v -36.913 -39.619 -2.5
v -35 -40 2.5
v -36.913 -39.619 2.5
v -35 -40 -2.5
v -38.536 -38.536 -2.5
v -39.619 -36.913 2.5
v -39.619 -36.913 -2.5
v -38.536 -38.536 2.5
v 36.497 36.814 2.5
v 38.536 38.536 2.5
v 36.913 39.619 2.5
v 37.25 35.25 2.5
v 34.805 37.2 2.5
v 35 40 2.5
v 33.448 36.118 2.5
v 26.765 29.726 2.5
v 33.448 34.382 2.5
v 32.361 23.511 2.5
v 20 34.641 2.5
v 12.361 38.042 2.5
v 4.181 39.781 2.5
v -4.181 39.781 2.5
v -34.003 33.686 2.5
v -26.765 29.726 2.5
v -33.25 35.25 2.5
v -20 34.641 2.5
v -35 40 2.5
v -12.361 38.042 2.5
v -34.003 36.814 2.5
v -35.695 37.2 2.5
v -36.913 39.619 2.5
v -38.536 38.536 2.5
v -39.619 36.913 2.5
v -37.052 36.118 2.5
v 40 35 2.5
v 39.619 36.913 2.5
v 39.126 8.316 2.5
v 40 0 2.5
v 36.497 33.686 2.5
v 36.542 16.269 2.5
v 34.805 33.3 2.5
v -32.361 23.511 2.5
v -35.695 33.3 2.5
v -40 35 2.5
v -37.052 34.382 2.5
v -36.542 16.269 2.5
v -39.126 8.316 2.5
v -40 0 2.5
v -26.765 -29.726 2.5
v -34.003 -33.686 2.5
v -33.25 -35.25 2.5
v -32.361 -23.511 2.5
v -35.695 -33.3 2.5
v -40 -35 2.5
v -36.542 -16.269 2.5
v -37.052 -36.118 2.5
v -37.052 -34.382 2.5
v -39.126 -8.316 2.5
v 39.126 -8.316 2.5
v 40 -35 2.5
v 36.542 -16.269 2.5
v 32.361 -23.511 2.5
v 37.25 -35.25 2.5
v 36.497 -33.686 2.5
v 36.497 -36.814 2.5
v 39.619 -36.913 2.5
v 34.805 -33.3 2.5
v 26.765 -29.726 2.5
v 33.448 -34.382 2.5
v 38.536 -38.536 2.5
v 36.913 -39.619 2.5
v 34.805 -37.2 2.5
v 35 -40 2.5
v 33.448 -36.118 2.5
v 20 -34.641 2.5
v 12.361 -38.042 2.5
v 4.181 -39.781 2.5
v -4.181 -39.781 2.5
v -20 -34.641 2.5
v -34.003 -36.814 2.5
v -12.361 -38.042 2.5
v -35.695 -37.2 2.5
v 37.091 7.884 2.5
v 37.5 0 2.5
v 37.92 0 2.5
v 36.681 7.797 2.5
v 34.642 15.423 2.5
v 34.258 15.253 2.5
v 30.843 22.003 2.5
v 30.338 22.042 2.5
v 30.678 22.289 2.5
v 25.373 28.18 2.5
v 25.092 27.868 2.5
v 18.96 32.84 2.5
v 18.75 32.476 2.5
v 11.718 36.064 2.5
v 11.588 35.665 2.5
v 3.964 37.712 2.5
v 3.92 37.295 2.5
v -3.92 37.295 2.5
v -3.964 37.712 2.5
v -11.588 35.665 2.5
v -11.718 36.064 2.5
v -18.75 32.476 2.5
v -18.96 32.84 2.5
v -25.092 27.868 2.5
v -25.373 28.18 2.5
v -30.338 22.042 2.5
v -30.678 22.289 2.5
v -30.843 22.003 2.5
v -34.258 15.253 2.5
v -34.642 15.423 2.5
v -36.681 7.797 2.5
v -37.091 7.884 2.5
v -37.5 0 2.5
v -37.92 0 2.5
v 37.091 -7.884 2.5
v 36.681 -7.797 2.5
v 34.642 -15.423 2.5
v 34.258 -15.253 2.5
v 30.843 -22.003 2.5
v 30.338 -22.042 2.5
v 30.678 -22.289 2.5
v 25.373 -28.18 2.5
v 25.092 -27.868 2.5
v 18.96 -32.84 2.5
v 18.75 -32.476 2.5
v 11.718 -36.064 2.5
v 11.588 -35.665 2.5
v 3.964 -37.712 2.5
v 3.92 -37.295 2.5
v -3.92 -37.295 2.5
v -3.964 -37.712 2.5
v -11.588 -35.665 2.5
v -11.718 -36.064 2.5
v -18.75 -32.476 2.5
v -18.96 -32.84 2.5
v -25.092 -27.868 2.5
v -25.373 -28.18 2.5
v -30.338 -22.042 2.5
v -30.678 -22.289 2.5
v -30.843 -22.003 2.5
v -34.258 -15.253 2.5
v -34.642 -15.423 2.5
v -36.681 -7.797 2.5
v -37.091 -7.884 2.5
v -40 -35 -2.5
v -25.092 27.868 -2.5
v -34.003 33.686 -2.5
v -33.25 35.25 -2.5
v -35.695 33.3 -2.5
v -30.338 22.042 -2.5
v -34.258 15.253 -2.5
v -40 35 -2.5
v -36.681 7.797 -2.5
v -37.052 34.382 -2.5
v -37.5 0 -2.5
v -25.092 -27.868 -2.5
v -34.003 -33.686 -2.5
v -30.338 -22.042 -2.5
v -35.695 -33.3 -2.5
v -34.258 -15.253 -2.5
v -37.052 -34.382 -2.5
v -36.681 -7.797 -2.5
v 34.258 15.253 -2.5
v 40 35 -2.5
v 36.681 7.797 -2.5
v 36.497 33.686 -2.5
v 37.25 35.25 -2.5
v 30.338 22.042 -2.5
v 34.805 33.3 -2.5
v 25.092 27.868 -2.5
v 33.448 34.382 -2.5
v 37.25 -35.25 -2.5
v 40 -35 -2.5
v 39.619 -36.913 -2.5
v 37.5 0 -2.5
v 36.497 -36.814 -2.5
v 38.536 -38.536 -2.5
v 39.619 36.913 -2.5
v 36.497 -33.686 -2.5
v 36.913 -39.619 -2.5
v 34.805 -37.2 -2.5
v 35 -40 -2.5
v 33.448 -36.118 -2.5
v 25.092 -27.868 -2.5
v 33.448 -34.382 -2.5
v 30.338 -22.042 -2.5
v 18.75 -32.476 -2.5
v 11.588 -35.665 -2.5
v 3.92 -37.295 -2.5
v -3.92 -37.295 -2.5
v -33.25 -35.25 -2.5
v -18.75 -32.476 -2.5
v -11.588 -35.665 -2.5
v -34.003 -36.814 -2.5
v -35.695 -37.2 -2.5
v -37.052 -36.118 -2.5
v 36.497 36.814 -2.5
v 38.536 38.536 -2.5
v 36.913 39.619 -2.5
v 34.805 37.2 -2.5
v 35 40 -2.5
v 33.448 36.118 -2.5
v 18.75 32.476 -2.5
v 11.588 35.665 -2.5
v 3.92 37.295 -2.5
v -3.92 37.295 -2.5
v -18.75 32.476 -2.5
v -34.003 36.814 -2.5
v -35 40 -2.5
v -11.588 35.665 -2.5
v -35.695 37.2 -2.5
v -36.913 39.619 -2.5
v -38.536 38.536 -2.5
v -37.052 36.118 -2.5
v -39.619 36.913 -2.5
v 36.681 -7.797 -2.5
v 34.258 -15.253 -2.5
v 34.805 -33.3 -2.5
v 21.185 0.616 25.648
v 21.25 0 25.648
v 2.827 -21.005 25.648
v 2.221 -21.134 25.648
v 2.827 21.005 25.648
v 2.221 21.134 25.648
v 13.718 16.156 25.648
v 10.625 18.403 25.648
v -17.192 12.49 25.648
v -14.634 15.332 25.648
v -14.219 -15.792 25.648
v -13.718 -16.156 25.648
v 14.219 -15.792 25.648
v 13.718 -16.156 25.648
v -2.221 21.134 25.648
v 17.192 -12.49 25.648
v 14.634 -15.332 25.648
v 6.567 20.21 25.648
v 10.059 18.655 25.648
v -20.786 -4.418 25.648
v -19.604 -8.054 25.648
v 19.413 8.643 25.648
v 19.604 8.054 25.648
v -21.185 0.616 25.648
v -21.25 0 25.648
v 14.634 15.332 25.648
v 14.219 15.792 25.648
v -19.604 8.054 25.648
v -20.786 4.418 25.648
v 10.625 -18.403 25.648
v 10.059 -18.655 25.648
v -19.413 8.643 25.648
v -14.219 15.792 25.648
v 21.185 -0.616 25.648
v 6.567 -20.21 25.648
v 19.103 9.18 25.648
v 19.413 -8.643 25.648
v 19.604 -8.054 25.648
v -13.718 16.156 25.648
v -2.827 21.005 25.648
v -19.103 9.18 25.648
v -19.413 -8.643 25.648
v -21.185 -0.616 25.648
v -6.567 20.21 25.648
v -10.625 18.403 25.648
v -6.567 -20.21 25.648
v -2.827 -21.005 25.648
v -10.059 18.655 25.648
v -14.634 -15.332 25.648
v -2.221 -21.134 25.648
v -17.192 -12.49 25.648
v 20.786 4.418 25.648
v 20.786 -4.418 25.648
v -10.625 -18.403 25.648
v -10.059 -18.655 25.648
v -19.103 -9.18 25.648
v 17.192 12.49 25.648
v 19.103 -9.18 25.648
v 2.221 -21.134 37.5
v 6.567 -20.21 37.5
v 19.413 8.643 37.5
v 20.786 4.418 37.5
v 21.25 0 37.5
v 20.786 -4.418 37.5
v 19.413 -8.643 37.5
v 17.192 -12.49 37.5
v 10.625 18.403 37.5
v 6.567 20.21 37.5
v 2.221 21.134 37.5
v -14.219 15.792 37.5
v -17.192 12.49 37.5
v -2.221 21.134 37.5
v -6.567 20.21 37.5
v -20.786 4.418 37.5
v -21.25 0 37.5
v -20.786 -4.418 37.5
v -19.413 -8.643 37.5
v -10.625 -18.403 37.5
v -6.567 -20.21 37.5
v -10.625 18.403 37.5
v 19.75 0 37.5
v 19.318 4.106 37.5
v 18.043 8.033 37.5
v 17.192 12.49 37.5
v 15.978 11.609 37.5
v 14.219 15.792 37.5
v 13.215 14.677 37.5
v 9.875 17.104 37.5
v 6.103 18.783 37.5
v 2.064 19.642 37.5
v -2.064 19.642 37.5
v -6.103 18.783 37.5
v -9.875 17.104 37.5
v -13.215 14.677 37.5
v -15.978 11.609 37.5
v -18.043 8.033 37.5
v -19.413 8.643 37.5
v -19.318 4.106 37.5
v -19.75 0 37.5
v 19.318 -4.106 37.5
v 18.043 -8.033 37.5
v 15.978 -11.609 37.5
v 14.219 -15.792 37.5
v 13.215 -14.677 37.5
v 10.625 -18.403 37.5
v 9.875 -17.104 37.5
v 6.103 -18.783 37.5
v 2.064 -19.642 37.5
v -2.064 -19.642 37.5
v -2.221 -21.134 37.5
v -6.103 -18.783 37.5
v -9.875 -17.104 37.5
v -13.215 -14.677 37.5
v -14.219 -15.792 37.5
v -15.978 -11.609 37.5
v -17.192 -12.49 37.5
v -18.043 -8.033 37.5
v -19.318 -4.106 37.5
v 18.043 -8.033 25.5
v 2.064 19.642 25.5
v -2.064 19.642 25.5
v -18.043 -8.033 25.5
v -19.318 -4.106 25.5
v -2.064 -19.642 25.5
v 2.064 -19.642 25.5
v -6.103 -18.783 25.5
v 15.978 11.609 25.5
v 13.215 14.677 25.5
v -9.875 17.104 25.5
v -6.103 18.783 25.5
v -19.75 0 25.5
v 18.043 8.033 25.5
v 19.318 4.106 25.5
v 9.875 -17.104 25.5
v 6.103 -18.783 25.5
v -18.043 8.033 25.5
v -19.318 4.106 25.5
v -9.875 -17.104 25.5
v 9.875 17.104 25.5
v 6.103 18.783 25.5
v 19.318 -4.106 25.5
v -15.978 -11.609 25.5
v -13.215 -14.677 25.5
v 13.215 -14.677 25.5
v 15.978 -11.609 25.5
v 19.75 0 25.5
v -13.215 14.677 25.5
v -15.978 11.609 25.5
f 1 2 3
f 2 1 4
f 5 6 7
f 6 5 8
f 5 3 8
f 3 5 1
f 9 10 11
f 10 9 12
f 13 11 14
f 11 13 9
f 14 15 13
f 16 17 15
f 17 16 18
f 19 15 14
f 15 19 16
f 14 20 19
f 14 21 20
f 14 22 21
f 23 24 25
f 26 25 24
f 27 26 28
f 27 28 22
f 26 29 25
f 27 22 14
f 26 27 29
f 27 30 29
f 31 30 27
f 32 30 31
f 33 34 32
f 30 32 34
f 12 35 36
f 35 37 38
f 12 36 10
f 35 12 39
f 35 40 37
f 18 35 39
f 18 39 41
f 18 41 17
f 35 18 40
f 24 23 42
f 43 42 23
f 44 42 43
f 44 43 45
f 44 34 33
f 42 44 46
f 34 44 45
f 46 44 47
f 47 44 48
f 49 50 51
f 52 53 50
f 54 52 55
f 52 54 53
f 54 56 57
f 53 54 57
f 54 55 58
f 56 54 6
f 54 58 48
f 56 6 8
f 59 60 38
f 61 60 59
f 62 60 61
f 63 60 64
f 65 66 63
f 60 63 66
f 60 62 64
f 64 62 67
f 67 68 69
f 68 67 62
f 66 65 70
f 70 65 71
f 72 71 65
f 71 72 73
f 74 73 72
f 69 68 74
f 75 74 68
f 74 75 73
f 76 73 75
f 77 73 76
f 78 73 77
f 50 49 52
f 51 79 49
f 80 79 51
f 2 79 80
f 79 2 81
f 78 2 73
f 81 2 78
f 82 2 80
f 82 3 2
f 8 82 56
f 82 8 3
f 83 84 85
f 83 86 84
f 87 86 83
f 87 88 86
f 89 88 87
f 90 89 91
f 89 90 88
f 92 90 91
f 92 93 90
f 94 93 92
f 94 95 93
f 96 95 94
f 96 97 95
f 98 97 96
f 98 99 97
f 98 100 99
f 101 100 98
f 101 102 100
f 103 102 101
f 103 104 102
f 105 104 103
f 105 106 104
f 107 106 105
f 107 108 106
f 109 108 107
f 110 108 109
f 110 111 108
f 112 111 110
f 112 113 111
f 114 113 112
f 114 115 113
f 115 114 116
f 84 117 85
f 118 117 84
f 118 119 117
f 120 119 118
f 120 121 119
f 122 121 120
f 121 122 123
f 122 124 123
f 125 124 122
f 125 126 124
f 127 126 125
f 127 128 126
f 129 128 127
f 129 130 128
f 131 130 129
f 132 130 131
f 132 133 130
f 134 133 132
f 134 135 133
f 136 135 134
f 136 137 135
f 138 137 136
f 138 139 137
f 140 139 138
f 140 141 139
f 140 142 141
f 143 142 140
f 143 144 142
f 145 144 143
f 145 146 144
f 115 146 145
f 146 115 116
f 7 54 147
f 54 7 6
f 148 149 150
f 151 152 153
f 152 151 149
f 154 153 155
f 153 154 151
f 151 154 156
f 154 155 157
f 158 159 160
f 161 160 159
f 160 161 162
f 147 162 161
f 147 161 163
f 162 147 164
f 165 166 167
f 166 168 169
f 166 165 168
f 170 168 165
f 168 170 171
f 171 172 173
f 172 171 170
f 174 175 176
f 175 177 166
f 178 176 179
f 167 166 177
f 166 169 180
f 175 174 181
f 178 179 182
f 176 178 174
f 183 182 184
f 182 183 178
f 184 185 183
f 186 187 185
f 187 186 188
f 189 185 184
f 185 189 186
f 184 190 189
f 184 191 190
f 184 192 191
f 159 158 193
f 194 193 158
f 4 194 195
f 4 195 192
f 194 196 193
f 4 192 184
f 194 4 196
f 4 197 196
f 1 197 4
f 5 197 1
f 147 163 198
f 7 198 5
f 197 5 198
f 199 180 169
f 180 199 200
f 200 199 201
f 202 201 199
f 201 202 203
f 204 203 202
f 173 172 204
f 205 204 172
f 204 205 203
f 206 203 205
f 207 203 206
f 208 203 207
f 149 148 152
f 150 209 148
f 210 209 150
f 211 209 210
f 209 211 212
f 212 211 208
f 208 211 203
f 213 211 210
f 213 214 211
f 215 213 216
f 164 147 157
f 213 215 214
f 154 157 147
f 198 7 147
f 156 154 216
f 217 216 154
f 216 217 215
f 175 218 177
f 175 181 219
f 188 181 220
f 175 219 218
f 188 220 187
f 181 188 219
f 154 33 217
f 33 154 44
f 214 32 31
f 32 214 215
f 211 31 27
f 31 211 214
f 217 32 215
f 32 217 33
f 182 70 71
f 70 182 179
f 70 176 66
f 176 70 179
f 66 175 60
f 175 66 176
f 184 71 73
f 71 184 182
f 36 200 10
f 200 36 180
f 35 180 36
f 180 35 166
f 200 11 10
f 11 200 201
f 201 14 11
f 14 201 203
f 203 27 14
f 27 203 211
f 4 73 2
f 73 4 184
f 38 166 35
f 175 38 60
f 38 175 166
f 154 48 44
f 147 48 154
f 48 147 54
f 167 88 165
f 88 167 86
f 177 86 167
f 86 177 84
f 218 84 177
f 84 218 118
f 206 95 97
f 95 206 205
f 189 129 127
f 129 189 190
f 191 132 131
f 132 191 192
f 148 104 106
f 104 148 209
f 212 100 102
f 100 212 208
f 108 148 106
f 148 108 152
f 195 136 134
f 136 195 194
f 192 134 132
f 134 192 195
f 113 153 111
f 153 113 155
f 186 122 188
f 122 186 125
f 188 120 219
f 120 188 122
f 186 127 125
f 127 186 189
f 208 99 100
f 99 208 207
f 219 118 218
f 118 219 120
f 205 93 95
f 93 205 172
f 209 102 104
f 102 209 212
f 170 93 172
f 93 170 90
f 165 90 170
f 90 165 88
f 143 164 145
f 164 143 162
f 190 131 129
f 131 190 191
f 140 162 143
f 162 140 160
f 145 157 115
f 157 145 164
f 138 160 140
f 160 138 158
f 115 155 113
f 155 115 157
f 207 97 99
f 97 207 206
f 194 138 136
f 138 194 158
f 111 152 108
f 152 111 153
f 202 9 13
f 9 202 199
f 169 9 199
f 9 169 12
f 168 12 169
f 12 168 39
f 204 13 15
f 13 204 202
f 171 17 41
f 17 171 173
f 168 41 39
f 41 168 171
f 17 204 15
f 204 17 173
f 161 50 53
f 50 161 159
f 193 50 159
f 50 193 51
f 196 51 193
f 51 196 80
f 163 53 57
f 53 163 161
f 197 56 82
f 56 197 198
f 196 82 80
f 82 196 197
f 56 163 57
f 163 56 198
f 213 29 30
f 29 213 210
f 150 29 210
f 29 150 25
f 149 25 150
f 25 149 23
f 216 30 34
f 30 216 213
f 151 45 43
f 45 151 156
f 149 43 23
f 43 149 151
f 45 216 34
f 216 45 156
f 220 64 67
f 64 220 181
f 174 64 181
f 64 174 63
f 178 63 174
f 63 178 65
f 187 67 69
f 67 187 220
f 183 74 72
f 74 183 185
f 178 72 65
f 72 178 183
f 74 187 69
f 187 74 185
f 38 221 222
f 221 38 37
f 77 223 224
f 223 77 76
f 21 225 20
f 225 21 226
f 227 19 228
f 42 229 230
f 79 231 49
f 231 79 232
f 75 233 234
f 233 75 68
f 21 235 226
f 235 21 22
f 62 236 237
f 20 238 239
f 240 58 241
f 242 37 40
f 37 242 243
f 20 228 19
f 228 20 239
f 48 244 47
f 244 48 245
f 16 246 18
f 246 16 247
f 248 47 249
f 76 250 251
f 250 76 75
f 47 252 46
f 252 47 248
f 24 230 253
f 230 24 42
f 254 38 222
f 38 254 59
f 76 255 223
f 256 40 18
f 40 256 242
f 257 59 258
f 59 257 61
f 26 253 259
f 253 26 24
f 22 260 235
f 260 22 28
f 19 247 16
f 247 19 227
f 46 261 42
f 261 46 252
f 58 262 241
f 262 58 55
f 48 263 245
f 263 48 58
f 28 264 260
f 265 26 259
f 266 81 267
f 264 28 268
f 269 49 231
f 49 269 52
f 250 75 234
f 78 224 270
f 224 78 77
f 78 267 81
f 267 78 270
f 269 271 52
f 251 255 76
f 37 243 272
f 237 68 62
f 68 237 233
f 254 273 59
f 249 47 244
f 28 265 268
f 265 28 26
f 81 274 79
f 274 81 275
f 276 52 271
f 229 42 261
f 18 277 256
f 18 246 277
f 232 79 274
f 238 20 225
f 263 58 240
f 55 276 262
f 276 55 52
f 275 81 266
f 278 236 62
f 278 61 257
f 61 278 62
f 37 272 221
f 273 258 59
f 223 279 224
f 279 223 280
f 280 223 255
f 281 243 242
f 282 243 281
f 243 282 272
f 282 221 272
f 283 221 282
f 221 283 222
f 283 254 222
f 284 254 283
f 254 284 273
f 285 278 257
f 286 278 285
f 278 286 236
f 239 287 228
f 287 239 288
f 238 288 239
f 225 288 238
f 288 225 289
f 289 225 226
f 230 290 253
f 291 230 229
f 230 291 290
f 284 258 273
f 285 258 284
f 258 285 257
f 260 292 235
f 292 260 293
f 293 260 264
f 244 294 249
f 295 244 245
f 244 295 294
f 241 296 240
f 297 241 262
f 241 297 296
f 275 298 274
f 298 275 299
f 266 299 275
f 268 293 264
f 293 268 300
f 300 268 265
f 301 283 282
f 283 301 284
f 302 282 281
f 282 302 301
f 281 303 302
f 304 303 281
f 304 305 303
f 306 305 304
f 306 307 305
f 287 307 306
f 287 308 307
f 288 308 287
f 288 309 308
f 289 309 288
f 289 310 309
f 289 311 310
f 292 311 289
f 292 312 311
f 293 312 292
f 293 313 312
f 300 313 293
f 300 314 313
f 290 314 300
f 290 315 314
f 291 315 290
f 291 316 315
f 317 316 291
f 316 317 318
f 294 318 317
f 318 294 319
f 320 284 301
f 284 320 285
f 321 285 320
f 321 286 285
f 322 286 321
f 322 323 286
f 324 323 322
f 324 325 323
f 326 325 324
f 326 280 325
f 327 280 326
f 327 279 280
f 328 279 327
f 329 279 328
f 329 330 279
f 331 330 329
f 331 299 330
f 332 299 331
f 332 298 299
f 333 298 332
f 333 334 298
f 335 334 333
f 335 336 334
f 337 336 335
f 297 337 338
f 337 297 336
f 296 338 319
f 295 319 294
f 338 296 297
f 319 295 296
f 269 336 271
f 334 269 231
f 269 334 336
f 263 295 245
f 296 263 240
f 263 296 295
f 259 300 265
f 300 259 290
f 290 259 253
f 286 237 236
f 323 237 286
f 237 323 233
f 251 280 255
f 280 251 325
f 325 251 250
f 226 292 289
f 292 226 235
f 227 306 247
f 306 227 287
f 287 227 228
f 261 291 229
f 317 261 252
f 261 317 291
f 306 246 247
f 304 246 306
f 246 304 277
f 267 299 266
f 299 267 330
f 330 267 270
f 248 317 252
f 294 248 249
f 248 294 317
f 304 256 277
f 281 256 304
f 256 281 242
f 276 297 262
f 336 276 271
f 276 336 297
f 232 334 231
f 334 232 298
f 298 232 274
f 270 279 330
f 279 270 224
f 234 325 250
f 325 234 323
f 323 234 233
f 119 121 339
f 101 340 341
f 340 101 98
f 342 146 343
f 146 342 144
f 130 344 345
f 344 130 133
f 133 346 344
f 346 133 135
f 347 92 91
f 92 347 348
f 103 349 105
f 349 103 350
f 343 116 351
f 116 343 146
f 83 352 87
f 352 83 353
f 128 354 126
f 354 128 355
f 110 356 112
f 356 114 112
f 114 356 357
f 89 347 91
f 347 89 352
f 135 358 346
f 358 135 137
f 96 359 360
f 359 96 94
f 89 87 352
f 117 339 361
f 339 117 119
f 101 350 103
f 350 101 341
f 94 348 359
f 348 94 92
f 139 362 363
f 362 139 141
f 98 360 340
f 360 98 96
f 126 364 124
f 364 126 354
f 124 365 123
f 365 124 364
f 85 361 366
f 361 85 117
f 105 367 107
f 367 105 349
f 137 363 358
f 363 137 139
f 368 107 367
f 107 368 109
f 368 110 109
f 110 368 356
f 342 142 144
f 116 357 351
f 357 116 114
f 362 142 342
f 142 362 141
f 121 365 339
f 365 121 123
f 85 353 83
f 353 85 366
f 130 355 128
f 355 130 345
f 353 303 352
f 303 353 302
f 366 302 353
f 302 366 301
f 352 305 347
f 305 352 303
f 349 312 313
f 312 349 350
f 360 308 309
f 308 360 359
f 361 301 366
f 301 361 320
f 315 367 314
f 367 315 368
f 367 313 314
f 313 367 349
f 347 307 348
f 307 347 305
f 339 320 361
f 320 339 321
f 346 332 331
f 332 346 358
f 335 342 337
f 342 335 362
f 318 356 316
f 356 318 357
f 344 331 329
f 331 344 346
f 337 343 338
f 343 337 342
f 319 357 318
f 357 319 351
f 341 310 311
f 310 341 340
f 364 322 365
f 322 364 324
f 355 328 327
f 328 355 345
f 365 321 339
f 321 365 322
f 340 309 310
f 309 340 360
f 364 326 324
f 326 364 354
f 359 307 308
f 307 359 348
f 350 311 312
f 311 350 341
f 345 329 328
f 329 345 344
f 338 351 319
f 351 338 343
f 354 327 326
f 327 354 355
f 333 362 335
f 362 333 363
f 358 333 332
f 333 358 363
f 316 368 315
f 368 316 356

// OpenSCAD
use <MCAD/boxes.scad>
difference() {
    roundedBox([$fanSize, $fanSize, 5], 5, true); 
    cylinder(7,37.5,37.5,true);
    translate([35.25,35.25,0]) {cylinder(7,2,2,true);}
    translate([-35.25,-35.25,0]) {cylinder(7,2,2,true);}
    translate([-35.25,35.25,0]) {cylinder(7,2,2,true);}
    translate([35.25,-35.25,0]) {cylinder(7,2,2,true);}
}
$fanSize = 80;
$outRad = 19.75;
$coneHeight = 25;
translate([0,0,2.5]) {
    difference() {
        joiningPipe();
        translate([0,0,-2]) {cylinder($coneHeight,39.5,$outRad,false);}
        cylinder(52,$outRad,$outRad,false);
    }
}
module joiningPipe() {
    cylinder($coneHeight,40,$outRad,false);
    cylinder($coneHeight+10,$outRad+1.5,$outRad+1.5,false);    
}
